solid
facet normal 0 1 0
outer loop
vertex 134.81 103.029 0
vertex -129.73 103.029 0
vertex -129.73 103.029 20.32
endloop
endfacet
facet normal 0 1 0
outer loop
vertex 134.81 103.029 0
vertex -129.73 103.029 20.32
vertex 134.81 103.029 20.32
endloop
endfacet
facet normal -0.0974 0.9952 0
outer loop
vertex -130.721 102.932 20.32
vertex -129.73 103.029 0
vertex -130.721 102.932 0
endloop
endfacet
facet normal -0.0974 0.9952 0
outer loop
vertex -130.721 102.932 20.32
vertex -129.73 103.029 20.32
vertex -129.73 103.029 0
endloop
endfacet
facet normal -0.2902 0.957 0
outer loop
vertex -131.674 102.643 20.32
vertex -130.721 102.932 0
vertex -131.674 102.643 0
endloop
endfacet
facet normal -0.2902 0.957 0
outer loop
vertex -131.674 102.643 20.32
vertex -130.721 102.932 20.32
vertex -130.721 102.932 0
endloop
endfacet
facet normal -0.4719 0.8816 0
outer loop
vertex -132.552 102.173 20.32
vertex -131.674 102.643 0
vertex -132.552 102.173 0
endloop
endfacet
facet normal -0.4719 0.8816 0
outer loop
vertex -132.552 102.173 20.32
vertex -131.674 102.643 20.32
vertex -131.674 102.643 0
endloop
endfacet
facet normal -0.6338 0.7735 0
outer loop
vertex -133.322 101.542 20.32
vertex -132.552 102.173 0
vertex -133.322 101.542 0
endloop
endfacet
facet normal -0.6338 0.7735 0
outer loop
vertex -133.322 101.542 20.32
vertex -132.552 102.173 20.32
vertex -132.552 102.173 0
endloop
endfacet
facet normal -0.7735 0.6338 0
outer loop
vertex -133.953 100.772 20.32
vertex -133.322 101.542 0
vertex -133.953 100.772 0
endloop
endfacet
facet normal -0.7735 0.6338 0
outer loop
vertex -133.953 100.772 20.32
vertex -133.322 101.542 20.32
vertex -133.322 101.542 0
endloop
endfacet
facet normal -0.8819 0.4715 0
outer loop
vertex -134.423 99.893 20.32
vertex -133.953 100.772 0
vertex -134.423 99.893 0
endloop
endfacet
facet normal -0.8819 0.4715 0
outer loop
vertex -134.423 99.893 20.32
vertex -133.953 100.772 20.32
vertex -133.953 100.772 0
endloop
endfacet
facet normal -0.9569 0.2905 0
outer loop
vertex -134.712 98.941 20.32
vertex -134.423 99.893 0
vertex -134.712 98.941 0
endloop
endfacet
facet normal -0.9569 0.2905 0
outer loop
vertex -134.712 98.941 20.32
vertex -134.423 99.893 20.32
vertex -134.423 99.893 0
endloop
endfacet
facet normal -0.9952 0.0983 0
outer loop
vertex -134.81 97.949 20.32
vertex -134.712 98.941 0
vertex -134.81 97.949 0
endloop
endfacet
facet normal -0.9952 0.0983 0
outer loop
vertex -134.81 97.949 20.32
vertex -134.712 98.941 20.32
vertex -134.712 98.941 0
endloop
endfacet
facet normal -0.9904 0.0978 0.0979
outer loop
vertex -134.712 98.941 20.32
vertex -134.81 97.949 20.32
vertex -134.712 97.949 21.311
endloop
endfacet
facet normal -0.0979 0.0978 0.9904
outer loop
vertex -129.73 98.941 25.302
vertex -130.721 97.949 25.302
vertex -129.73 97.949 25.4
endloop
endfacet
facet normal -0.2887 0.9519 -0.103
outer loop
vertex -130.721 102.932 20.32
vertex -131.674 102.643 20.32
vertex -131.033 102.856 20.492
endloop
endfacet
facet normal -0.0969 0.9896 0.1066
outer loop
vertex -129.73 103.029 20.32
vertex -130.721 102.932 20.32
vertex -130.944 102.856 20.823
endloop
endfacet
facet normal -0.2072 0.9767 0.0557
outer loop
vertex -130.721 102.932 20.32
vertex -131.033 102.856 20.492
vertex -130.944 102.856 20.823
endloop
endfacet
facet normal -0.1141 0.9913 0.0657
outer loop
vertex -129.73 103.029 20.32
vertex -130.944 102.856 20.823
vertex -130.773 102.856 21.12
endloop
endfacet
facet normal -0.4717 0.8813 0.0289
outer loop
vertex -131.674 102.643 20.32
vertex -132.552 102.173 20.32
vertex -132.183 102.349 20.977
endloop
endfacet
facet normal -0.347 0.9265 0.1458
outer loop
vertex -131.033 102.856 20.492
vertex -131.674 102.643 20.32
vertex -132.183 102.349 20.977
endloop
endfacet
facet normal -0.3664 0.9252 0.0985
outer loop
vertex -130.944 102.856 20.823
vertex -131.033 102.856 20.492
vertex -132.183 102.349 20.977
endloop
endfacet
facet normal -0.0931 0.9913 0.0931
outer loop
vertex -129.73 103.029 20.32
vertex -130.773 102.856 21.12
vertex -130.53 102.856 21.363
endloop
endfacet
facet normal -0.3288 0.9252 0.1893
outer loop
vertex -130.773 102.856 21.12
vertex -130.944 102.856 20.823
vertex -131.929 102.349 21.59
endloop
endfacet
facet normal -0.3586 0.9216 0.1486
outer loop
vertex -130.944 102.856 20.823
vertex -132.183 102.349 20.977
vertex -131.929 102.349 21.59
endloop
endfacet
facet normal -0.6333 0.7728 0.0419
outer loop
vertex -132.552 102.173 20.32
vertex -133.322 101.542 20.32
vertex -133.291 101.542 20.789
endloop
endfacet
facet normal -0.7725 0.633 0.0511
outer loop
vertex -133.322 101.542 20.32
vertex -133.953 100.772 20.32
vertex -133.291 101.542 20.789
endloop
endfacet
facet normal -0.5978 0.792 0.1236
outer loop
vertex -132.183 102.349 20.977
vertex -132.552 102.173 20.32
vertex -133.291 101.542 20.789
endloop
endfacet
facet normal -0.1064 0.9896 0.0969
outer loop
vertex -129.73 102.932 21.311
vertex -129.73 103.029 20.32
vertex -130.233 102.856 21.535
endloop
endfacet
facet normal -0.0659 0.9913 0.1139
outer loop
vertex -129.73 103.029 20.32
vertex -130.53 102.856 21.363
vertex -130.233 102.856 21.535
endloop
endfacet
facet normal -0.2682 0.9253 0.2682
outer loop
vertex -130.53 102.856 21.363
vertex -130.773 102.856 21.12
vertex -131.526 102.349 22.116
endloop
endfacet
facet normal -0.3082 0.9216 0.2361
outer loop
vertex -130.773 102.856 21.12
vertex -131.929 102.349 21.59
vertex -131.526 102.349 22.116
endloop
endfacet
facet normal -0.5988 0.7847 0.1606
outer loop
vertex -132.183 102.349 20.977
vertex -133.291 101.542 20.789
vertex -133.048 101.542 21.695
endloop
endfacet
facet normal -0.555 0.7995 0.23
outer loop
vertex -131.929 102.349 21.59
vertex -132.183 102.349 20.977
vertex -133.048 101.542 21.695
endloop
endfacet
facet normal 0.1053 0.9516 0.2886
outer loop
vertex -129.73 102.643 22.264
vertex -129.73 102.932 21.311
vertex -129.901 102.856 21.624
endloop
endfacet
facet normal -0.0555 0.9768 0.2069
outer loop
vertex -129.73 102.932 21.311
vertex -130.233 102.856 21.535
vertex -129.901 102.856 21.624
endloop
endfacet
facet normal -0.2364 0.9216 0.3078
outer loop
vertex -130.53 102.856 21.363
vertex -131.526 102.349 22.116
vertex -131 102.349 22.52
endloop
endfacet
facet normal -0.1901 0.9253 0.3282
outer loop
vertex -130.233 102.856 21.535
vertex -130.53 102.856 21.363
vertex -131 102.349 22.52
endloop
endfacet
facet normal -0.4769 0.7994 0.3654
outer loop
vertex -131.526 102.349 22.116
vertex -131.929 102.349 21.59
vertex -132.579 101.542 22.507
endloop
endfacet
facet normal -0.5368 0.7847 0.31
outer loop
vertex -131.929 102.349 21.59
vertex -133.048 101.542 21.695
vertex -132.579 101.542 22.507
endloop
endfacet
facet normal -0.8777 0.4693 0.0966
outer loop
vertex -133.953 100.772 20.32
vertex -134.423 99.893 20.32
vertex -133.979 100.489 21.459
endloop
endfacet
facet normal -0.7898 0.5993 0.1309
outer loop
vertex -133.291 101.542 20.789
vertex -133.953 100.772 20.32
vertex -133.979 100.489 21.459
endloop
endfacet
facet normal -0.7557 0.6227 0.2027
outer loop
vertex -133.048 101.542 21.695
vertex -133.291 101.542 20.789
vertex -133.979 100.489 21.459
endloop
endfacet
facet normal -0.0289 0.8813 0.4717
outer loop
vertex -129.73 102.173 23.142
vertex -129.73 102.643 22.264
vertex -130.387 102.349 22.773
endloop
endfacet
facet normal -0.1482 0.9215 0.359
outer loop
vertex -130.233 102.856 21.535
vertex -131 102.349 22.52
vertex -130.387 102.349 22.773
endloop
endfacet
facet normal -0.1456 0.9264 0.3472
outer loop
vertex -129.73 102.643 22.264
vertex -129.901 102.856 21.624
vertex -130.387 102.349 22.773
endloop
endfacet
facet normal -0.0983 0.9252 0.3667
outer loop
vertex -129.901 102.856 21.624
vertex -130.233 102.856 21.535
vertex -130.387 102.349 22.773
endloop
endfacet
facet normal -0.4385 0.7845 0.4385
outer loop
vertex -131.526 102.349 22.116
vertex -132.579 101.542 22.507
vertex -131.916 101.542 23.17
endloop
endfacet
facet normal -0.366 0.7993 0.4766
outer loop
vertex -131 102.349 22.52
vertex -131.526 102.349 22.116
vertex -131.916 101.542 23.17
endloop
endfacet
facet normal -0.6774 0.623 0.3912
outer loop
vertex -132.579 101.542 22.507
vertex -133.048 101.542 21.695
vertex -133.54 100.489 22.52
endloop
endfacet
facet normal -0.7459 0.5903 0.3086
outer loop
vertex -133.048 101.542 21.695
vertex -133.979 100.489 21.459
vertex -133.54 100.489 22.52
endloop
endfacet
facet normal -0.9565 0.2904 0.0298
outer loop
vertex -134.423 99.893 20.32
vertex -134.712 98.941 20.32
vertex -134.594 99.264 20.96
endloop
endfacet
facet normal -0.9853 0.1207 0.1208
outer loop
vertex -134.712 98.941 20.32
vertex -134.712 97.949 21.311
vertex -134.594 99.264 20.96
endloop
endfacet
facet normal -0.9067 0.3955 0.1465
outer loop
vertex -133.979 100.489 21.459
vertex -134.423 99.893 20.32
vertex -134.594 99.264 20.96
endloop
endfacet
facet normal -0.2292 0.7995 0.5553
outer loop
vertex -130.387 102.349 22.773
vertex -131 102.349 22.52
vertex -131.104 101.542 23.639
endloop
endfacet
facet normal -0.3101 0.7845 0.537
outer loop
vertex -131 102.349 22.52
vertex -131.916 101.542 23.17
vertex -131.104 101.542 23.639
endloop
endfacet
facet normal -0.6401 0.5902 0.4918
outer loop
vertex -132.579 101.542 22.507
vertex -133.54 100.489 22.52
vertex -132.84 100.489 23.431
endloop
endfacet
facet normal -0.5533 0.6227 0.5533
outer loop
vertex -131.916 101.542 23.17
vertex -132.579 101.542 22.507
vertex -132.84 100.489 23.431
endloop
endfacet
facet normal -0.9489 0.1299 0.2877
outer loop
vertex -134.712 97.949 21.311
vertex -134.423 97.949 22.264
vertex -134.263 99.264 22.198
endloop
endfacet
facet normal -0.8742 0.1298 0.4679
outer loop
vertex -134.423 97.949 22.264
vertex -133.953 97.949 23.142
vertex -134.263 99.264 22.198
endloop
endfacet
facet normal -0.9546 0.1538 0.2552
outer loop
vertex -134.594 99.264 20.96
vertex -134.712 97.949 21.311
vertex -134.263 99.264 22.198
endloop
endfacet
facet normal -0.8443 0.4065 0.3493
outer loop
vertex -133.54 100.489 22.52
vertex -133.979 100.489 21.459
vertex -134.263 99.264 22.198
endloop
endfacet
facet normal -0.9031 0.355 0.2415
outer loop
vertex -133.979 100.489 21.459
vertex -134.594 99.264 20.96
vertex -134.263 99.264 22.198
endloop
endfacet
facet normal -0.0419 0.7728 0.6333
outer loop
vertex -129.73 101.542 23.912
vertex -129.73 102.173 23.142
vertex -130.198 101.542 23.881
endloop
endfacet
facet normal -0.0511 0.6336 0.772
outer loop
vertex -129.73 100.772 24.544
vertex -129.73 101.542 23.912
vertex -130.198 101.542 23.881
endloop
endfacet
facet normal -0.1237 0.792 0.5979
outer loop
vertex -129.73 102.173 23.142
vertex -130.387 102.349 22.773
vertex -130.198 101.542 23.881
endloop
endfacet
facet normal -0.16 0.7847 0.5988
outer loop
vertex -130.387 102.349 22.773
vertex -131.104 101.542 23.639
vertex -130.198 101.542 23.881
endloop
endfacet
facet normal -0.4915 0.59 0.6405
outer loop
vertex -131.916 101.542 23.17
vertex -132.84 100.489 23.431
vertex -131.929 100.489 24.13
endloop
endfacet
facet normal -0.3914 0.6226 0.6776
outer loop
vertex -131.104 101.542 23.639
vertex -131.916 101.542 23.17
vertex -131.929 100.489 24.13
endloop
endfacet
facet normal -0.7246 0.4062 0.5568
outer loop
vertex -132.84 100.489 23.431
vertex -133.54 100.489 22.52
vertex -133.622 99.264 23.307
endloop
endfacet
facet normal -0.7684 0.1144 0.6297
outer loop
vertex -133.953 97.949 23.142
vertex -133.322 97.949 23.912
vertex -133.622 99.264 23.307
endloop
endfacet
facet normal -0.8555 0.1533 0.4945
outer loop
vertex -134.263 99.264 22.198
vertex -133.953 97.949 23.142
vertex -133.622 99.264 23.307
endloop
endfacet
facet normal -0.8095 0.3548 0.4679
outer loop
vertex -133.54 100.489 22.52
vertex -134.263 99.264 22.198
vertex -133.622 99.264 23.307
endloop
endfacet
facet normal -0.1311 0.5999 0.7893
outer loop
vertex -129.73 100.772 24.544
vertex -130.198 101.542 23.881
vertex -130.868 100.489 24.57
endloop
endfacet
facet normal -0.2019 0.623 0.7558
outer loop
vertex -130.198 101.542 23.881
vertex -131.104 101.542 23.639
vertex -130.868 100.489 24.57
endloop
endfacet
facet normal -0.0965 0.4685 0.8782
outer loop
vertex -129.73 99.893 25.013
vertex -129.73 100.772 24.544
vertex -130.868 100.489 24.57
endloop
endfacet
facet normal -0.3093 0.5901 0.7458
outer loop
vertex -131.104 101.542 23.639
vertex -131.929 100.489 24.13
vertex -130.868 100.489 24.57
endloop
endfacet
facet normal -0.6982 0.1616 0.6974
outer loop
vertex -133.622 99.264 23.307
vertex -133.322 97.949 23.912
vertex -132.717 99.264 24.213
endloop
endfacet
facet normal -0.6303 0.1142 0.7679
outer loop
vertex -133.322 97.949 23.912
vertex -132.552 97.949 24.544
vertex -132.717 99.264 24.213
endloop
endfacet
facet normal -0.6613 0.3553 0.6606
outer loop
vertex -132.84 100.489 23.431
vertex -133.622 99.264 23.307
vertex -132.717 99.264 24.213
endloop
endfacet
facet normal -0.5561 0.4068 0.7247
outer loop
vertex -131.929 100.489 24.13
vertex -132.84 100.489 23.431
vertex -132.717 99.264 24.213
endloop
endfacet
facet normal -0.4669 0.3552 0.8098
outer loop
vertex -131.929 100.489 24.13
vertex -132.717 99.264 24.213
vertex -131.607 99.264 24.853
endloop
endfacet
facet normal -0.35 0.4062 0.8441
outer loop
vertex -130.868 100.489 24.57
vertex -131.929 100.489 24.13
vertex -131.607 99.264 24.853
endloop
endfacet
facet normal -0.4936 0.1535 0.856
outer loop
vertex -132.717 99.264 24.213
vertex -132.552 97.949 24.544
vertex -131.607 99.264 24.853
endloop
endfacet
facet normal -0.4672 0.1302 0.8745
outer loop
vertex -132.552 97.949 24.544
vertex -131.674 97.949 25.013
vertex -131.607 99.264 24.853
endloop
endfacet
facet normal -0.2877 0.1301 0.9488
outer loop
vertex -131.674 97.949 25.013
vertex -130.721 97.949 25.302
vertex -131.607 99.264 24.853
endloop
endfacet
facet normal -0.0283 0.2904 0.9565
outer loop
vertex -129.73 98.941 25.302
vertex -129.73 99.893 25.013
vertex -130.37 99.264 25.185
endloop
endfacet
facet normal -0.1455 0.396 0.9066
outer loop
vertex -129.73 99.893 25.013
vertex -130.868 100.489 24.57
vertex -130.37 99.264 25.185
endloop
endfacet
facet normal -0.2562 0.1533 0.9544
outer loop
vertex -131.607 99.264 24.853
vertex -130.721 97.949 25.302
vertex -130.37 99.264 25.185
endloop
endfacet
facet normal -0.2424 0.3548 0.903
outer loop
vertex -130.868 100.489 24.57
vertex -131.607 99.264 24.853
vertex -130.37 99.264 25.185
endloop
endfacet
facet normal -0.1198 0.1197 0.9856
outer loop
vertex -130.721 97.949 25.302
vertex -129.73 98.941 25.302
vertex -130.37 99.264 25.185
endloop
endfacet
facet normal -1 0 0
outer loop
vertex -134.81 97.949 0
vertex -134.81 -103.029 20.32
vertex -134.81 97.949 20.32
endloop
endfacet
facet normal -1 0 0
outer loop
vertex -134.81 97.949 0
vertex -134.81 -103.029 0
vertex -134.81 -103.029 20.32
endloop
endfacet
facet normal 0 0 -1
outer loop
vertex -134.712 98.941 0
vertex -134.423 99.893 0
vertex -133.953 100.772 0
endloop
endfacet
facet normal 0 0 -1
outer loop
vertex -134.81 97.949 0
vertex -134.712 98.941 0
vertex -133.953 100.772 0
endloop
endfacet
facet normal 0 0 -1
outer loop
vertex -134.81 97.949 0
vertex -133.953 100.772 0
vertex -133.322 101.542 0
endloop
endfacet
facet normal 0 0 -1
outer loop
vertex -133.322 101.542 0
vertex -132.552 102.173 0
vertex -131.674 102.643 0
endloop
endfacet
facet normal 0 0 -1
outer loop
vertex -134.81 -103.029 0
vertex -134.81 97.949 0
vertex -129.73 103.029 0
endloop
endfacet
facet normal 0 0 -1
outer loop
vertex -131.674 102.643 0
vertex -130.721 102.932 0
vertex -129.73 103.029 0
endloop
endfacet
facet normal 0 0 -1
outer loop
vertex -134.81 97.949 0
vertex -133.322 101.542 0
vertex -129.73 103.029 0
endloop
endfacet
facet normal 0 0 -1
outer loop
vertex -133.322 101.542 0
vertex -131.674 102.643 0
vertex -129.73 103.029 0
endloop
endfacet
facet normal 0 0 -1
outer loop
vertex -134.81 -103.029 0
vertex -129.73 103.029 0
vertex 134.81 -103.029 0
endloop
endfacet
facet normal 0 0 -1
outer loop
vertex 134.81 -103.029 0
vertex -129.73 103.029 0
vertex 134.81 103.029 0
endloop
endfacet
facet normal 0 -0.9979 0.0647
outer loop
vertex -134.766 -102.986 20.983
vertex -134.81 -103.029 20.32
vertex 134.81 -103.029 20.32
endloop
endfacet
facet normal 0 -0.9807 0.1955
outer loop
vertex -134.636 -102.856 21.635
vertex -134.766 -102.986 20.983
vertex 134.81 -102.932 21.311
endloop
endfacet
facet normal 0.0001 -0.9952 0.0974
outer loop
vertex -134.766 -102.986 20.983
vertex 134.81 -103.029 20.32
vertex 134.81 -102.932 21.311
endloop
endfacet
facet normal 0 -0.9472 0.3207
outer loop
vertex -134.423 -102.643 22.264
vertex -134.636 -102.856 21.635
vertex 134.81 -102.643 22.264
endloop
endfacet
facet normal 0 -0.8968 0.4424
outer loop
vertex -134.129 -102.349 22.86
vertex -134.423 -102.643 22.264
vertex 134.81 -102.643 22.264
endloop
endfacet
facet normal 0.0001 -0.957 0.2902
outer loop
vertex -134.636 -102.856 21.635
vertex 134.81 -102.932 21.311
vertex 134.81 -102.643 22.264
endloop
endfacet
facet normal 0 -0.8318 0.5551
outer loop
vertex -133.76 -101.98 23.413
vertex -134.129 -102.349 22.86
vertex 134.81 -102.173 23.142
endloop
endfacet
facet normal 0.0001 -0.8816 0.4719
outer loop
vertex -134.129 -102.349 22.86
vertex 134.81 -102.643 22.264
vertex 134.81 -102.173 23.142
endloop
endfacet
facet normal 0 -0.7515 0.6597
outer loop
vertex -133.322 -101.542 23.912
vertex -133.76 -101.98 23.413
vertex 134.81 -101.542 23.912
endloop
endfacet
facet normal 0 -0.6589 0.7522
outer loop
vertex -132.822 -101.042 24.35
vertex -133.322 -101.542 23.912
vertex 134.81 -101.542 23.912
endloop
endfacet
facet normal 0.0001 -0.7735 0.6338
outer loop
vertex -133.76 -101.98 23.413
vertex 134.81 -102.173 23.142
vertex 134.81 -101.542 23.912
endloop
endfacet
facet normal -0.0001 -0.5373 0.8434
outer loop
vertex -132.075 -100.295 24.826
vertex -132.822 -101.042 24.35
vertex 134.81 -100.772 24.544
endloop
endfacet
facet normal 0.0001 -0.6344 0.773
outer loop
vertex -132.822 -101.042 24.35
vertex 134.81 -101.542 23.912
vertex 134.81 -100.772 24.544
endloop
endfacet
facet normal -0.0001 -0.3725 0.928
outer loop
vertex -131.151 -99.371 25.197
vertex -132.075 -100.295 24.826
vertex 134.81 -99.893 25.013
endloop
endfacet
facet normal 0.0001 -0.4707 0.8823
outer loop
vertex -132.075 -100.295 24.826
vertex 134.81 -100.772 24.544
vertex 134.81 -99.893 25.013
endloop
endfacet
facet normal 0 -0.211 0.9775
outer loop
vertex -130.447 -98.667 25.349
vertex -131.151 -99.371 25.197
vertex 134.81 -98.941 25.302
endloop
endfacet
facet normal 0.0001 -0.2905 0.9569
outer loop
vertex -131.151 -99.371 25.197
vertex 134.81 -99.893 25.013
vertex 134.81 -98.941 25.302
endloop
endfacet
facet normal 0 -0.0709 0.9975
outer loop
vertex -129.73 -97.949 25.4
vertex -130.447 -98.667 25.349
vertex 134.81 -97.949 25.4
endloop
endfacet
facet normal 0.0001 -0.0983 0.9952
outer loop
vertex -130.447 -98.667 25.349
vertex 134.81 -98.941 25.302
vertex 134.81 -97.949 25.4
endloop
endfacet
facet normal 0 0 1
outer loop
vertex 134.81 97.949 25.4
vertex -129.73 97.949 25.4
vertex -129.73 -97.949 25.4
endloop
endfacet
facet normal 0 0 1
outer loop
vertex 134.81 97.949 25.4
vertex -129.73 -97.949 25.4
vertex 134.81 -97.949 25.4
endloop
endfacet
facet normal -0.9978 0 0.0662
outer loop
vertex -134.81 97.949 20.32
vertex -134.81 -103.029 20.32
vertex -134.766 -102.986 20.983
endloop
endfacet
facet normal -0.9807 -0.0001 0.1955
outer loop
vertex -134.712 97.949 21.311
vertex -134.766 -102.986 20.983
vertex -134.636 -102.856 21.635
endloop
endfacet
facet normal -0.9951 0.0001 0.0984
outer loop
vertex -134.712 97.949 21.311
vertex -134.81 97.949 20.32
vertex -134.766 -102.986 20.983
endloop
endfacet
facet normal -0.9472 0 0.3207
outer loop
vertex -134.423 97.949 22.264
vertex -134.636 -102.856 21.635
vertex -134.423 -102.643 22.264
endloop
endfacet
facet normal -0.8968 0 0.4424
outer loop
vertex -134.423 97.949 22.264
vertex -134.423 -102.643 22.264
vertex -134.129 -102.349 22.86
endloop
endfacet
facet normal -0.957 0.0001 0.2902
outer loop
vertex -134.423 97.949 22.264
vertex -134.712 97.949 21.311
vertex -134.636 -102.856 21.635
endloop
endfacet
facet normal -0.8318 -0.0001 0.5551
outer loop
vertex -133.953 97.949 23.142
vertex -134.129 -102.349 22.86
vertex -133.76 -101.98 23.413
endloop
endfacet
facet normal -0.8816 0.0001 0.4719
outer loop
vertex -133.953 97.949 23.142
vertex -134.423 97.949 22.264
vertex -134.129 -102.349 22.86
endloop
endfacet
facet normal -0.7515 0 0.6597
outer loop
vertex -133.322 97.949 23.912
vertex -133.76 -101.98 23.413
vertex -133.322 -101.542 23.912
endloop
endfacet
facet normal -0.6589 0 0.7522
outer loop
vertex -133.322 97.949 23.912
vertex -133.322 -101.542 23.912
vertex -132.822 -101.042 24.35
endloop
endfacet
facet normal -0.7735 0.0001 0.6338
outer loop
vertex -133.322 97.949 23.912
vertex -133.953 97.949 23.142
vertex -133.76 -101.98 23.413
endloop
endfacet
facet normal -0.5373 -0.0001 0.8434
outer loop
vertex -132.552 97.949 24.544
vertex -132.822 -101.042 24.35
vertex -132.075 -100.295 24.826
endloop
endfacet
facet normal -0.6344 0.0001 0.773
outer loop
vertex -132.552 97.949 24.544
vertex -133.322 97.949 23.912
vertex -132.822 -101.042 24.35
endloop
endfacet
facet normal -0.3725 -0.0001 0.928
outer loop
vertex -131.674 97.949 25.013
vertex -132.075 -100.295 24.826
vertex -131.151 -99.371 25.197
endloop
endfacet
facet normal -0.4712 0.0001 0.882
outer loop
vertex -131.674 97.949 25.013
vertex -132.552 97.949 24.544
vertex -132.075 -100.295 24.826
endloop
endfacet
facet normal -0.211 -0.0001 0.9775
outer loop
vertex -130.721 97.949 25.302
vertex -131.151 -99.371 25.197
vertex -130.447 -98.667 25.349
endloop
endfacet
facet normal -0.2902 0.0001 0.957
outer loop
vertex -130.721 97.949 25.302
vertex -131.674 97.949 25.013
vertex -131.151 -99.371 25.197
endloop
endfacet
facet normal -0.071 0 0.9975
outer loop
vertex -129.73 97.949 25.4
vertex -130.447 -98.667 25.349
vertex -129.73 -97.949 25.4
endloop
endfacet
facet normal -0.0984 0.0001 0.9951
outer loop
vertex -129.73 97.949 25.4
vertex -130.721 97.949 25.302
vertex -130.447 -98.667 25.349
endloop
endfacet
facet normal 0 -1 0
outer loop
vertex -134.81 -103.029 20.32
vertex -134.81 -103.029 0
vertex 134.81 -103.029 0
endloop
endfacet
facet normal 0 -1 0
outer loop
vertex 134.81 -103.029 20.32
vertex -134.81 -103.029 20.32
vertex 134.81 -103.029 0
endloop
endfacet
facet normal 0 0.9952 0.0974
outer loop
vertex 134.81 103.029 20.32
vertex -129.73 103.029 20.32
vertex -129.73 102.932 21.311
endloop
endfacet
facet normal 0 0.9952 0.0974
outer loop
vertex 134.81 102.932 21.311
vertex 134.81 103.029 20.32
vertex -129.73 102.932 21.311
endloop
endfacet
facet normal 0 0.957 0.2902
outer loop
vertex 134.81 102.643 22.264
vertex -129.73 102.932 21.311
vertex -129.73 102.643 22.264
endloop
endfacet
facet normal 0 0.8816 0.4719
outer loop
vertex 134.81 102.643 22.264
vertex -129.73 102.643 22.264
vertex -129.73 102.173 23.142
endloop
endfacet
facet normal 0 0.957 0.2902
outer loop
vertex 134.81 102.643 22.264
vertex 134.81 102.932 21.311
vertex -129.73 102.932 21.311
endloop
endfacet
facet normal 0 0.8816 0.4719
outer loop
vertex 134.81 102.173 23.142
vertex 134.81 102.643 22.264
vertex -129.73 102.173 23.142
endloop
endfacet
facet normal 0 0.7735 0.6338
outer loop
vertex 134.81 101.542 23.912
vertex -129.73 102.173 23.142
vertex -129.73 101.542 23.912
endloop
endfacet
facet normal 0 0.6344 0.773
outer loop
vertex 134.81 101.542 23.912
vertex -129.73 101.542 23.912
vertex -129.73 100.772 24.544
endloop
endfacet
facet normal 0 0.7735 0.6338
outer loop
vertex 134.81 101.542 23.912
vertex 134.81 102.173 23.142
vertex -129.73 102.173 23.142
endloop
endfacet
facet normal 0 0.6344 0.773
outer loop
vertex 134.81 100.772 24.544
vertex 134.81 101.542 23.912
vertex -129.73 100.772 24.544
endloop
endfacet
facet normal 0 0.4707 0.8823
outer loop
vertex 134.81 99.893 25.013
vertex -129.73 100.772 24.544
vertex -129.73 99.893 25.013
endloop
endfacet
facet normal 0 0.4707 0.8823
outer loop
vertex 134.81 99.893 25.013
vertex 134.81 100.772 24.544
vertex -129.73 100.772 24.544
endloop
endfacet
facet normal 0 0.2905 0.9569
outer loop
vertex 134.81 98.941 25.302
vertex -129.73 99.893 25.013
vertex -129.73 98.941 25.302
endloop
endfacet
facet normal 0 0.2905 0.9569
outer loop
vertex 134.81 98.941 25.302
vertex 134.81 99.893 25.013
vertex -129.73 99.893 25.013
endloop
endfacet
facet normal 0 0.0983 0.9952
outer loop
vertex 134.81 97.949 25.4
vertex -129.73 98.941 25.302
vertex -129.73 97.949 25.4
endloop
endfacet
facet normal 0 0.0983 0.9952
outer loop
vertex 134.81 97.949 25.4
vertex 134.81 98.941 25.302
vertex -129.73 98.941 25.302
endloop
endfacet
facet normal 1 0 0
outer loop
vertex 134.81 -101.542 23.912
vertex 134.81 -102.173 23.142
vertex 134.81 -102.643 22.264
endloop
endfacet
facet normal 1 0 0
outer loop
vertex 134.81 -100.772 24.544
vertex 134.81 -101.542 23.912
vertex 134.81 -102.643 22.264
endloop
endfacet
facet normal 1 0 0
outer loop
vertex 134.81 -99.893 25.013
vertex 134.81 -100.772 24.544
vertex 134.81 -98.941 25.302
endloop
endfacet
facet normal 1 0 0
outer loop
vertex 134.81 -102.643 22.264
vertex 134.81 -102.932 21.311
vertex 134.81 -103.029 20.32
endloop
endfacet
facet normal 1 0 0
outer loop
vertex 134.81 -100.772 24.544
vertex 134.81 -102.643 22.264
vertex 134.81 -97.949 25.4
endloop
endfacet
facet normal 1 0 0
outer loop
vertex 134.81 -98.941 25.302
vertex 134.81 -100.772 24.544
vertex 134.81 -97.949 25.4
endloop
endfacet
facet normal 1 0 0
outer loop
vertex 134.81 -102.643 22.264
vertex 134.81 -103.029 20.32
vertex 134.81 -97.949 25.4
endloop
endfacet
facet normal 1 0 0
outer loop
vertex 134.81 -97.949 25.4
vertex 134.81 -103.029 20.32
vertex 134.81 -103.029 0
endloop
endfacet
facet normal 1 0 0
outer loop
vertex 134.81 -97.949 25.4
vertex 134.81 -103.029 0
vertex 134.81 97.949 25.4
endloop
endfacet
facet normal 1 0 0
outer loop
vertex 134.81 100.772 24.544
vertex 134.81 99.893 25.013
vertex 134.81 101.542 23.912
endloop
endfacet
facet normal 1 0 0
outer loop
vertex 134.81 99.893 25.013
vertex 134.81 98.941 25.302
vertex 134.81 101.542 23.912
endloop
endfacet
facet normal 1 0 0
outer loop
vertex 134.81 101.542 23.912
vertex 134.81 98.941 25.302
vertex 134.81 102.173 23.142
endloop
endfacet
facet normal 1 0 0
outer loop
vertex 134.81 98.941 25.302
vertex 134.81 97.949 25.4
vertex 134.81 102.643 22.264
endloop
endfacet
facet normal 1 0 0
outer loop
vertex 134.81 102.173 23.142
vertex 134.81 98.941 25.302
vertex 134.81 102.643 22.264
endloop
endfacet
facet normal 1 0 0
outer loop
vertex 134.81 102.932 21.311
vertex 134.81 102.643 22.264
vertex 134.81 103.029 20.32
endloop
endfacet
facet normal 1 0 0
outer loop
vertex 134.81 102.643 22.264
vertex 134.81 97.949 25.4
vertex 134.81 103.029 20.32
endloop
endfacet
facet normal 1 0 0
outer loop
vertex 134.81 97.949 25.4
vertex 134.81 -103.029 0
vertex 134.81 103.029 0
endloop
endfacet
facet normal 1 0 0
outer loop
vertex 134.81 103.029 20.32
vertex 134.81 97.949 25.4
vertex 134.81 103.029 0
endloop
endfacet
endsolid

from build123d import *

# Parameters (mm, degrees)
F0_W     = 269.619048
F0_H     = 206.058934
F1_DEPTH = 25.4
F2_R     = 5.08
F3_R     = 5.08


with BuildPart() as f1:
    # F0 (on Top) → F1 (new body)
    with BuildSketch(Plane.XY):
        Rectangle(F0_W, F0_H)
    extrude(amount=F1_DEPTH)

    # F2
    f2_edges = [f1.edges().sort_by_distance(p)[0] for p in [
        (-134.809524, 0, 25.4),
        (0, -103.029467, 25.4),
    ]]
    fillet(f2_edges, radius=F2_R)

    # F3
    f3_edges = [f1.edges().sort_by_distance(p)[0] for p in [
        (2.54, 103.029467, 25.4),
    ]]
    fillet(f3_edges, radius=F3_R)


solid = f1.part
